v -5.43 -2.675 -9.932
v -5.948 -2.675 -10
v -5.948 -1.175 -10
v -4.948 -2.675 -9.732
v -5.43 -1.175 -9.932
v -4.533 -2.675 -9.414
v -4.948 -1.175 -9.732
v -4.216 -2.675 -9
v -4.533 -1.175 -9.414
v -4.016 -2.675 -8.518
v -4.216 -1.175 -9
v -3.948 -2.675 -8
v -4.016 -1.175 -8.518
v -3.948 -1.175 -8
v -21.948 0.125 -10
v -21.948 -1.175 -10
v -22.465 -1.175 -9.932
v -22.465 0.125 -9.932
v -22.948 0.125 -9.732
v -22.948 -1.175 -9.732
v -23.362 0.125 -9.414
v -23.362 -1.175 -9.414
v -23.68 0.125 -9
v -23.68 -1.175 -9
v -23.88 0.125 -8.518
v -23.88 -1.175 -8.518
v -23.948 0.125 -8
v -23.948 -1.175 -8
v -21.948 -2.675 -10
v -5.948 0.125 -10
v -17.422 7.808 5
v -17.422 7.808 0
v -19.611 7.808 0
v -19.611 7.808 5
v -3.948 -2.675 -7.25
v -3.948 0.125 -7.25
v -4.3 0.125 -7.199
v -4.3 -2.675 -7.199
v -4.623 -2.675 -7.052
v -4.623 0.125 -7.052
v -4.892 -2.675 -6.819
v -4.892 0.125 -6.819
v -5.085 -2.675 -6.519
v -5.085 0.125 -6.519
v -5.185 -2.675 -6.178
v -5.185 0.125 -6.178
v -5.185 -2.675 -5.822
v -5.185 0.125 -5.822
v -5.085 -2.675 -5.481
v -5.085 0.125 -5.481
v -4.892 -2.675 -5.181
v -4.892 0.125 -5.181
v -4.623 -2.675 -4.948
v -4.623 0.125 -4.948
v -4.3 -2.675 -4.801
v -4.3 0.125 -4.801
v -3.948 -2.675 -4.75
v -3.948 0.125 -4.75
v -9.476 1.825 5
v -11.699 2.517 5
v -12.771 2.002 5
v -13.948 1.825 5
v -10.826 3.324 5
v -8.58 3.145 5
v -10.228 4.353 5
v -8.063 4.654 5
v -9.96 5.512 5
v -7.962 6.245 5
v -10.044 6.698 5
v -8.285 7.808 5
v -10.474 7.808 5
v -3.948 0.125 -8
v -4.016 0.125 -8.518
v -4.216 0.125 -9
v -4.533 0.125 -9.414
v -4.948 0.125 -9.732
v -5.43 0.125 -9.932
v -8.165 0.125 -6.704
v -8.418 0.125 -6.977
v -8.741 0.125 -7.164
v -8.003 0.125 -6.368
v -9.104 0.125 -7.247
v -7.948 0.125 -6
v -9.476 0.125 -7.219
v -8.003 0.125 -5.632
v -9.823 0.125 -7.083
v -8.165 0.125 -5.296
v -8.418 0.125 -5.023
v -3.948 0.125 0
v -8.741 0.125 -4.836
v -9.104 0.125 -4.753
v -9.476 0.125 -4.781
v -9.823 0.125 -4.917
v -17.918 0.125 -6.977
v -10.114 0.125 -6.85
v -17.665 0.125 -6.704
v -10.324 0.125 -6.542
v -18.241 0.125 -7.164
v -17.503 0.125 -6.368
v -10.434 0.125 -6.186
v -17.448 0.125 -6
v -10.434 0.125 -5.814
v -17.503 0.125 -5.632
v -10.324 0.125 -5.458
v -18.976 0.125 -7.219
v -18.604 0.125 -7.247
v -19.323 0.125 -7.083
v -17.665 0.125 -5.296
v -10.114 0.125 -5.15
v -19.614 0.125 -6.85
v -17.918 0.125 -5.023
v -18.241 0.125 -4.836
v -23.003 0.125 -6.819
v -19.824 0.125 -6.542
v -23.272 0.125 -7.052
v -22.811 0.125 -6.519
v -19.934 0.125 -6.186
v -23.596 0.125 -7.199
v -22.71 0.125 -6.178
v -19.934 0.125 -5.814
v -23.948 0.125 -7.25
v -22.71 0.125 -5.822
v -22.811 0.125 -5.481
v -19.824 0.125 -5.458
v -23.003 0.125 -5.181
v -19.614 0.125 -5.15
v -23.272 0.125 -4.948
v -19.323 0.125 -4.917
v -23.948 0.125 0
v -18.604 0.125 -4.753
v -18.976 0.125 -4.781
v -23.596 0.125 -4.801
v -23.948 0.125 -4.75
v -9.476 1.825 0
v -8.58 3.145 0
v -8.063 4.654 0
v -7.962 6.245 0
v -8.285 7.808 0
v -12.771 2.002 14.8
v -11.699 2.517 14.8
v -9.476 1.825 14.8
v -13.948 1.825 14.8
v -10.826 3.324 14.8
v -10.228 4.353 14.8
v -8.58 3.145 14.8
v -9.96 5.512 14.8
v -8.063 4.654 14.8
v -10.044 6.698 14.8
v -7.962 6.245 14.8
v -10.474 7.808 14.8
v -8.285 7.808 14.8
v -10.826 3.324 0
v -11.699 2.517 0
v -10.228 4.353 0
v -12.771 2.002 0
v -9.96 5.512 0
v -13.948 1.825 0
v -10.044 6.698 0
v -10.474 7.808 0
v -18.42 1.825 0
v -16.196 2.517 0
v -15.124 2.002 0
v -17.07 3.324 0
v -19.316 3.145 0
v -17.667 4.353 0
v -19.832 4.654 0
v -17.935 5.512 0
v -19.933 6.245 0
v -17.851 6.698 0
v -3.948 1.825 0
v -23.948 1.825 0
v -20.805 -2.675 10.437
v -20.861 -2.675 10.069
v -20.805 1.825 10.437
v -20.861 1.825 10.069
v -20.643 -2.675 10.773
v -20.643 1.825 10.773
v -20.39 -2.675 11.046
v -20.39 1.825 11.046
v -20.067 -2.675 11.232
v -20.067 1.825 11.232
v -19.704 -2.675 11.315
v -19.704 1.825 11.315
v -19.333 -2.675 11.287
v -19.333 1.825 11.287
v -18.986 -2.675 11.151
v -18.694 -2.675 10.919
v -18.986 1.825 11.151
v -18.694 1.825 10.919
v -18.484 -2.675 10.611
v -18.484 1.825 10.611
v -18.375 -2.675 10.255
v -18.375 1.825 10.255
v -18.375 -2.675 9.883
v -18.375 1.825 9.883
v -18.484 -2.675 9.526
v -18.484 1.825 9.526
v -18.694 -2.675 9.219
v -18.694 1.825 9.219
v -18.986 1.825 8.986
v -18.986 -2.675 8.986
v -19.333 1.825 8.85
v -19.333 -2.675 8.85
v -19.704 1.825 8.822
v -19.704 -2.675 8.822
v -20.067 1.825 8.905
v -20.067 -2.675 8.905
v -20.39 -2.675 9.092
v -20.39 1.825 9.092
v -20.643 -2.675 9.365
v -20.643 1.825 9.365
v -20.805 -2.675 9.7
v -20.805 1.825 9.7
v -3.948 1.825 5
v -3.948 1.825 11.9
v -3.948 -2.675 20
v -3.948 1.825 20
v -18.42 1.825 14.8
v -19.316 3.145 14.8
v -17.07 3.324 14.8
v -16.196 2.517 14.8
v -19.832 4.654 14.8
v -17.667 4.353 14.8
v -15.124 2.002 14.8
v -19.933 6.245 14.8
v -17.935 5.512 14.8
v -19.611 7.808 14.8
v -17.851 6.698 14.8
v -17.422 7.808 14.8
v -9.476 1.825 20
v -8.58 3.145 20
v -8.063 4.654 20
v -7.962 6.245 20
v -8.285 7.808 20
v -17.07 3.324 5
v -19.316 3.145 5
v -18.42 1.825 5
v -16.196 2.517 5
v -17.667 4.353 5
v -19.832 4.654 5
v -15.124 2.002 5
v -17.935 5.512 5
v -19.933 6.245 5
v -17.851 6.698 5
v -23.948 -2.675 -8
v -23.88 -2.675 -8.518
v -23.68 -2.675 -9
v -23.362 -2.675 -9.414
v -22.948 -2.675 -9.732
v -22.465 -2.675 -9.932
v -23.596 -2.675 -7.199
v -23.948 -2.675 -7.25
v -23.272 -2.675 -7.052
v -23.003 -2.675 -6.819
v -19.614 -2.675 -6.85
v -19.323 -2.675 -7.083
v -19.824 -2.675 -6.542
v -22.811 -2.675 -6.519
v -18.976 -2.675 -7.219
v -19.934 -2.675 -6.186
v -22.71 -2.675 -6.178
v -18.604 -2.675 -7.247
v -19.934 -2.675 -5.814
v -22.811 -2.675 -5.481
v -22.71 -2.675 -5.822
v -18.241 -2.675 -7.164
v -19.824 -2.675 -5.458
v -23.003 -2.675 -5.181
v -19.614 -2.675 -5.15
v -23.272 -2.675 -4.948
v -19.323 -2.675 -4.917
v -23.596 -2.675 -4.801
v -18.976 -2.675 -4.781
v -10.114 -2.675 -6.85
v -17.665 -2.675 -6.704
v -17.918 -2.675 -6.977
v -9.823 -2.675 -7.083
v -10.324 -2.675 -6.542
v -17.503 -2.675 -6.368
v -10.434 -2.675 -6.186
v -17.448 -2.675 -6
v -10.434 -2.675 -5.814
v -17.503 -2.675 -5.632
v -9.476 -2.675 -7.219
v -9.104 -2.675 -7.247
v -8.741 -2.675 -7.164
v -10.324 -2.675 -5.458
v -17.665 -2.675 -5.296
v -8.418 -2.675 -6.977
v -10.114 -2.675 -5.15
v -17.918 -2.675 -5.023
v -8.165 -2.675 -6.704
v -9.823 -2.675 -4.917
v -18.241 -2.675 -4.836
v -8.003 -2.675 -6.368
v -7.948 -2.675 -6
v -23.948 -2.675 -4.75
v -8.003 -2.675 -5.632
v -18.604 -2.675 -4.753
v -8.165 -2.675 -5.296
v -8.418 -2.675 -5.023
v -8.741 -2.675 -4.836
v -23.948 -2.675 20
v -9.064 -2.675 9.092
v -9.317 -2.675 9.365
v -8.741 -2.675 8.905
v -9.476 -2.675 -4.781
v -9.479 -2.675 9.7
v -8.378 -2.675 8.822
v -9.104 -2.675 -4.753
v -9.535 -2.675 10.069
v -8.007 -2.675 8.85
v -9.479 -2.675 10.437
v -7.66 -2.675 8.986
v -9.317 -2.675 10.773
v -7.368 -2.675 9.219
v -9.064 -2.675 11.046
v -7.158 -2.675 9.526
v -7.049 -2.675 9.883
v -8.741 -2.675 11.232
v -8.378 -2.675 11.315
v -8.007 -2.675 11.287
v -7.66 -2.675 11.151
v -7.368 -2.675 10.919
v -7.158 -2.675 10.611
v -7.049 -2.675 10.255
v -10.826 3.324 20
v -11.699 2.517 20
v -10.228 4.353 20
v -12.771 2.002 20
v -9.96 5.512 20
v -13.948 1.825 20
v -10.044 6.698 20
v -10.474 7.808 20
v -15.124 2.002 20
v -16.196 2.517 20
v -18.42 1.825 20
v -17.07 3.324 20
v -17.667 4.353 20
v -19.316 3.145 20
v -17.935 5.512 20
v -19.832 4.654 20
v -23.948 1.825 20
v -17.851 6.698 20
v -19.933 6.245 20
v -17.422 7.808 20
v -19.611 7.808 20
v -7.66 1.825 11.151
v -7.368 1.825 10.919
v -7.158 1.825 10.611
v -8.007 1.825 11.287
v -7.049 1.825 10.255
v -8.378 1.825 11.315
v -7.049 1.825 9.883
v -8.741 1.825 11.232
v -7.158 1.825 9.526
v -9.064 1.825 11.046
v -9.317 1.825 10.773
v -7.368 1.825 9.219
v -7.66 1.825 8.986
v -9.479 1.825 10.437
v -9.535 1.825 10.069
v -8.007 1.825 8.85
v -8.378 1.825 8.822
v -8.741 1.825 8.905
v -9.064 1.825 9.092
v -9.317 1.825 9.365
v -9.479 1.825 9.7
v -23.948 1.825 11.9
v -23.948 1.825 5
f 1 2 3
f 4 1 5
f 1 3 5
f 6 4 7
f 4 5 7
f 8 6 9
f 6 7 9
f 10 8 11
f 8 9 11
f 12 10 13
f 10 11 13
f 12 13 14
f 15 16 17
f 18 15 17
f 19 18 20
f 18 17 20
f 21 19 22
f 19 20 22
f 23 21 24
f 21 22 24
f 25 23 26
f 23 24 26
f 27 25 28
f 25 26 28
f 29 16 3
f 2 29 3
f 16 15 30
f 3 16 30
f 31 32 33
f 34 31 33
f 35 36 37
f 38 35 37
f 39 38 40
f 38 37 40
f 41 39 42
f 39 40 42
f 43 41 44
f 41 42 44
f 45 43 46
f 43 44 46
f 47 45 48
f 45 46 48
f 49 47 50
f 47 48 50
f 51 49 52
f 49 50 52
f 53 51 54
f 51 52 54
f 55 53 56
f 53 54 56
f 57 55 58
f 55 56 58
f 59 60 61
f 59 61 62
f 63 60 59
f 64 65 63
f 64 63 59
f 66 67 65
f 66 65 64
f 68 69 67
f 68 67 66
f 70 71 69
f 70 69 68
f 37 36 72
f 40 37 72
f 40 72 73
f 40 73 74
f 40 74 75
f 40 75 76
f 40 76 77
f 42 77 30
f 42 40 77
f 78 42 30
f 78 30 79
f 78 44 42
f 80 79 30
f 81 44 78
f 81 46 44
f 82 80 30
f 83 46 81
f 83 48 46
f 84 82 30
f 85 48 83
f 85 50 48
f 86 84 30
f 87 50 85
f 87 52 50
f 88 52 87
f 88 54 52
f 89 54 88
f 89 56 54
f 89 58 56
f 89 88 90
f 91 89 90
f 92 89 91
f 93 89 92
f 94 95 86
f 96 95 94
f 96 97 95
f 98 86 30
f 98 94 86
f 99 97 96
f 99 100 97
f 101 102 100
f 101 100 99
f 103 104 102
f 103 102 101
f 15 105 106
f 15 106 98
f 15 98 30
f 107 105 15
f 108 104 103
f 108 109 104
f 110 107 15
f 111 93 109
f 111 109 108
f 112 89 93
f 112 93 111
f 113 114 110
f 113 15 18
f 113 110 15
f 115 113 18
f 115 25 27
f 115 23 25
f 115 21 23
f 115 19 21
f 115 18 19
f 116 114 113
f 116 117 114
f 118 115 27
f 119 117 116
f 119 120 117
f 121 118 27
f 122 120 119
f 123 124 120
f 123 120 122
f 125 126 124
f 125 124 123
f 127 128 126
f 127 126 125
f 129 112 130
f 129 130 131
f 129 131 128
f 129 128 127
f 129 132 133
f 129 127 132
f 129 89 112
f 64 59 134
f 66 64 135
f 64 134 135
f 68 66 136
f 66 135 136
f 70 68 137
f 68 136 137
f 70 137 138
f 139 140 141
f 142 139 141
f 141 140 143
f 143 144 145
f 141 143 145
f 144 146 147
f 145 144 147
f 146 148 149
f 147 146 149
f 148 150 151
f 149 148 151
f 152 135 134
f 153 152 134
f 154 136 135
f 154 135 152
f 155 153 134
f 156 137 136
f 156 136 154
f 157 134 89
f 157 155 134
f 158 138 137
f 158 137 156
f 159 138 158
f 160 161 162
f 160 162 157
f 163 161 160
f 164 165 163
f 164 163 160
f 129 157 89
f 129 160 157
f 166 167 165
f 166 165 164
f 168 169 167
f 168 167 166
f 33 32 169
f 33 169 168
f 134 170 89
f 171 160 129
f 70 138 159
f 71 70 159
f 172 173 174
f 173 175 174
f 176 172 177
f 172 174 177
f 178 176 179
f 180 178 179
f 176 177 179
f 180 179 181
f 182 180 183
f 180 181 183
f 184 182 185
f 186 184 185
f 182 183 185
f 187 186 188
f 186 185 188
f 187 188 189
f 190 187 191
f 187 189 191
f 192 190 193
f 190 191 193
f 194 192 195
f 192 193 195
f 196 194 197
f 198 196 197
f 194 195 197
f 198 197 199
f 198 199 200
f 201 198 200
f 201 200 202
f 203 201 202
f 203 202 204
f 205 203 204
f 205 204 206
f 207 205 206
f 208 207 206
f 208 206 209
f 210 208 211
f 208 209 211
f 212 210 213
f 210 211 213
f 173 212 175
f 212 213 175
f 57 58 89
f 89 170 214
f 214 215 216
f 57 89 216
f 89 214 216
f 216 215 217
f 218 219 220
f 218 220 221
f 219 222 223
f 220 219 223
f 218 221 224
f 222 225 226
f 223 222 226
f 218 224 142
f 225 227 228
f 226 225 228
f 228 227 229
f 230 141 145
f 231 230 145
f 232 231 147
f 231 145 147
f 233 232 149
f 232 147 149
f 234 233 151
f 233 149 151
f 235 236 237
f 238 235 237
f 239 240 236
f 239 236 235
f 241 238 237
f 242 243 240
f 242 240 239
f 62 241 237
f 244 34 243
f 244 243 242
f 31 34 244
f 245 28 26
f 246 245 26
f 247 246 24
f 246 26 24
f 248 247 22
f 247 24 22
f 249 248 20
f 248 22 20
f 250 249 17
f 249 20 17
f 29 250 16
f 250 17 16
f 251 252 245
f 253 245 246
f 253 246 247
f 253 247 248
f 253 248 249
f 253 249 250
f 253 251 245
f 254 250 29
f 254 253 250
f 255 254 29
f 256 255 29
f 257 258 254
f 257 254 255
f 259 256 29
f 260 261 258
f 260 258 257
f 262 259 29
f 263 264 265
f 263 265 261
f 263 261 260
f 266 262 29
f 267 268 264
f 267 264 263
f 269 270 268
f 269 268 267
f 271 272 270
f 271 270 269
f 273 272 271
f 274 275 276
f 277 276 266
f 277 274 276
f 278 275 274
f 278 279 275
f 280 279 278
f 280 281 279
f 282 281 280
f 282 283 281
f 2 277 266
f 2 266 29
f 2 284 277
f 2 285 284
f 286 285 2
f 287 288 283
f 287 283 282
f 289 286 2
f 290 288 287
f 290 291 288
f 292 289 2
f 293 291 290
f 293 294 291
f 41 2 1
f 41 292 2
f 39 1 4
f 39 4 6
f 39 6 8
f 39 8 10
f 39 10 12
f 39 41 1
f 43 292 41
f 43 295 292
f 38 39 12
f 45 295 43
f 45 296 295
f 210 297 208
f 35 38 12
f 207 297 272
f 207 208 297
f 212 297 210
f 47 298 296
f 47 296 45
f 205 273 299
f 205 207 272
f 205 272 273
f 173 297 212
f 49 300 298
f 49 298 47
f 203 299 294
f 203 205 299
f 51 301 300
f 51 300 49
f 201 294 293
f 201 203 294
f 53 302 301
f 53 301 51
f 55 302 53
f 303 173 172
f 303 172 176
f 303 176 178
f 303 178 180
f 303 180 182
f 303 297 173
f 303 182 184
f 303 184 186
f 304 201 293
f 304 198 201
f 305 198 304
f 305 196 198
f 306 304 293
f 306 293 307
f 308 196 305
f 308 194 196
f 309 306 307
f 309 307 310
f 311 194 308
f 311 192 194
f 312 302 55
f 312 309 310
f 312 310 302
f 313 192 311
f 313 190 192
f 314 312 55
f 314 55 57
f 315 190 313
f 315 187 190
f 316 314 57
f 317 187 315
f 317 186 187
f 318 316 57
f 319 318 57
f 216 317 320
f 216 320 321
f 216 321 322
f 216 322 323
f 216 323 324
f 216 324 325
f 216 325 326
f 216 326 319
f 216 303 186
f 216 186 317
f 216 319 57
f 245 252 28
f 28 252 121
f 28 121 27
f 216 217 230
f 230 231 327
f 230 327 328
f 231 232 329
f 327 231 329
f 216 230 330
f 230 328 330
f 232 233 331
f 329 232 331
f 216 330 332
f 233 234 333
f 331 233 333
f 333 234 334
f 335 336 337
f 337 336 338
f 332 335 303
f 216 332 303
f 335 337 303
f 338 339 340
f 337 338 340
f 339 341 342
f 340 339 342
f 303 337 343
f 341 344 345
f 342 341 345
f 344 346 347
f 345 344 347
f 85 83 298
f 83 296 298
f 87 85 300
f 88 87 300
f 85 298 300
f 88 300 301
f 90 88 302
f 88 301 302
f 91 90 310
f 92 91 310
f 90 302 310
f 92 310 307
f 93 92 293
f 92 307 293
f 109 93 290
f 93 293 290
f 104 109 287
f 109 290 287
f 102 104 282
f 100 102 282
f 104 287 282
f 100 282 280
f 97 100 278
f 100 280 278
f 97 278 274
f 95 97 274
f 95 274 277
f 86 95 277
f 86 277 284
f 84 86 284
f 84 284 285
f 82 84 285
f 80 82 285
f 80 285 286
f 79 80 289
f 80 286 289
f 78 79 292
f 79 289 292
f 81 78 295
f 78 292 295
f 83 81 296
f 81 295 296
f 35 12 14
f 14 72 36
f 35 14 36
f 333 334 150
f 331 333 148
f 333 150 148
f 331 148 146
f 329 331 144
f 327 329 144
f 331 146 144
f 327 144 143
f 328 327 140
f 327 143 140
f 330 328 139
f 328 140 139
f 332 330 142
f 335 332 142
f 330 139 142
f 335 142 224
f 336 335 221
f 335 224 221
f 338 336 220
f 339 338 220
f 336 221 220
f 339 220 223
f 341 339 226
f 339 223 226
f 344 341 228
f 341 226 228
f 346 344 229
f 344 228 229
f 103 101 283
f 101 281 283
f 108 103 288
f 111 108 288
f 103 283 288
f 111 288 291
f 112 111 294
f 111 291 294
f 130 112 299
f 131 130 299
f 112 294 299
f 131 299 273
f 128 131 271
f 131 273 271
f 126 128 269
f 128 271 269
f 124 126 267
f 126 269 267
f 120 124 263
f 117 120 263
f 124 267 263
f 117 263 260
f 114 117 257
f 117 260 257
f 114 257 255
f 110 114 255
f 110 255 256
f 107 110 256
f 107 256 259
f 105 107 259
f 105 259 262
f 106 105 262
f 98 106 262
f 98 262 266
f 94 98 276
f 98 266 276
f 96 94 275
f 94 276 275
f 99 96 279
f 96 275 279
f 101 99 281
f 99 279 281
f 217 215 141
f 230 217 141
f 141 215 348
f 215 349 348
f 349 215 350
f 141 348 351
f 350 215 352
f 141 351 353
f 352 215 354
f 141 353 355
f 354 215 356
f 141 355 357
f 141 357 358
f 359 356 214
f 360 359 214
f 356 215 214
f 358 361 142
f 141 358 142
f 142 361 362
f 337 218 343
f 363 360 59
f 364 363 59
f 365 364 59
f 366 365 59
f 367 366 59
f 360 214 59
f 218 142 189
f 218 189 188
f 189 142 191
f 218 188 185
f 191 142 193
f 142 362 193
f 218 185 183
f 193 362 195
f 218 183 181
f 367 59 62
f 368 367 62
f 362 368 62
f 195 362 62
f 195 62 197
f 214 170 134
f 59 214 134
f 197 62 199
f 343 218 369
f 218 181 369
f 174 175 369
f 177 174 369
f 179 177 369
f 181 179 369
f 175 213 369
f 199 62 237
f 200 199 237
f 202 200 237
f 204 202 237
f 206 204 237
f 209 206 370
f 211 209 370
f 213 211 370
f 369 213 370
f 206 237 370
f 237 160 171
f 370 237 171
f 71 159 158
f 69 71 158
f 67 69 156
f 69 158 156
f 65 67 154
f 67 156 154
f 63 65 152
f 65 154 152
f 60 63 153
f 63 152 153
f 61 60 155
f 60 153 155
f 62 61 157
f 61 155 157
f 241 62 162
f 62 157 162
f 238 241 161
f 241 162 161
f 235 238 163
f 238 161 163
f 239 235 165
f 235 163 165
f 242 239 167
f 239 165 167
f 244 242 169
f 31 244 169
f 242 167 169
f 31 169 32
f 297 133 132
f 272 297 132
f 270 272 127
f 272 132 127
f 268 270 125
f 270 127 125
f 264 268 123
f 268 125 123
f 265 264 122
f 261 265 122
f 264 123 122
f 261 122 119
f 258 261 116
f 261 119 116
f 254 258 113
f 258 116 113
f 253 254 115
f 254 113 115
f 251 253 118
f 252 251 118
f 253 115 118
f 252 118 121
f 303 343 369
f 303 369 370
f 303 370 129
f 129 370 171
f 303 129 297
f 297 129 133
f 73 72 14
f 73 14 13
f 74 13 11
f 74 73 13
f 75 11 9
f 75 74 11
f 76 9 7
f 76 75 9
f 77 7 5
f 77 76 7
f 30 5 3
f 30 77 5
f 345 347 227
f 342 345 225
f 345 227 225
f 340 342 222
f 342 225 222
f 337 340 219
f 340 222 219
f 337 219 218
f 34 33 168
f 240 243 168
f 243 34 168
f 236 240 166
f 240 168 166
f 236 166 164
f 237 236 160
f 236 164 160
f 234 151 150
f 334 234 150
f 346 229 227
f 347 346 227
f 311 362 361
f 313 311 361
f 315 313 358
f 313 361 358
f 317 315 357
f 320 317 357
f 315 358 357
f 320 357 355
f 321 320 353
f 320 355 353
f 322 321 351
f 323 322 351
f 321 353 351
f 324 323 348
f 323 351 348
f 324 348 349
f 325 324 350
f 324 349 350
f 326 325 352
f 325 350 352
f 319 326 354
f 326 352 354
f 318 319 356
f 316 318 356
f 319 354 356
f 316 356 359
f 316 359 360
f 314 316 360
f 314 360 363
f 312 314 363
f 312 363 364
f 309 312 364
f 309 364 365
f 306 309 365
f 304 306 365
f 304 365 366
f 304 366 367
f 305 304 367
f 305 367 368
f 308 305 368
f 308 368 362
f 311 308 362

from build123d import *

# Parameters (mm, degrees)
F1_DEPTH  = 20
F3_DEPTH  = 10
F4_R      = 1.25
F5_DEPTH  = 2.2
F7_DEPTH  = 10
F9_R      = 1.25
F10_DEPTH = 28.001
F11_R     = 2
F14_DEPTH = 1.5
F16_W     = 20
F16_H     = 10
F17_DEPTH = 26.7
F19_R     = 1.25
F20_DEPTH = 32.1
F22_W     = 20
F22_H     = 9.2705127583
F23_DEPTH = 6.9
F24_DEPTH = 2.9
F25_R     = 1.25
F26_DEPTH = 12.5


with BuildPart() as f1:
    # F0 (on Top) → F1 (new body)
    with BuildSketch(Plane.XY):
        with BuildLine():
            Line((-17.4218026286, 7.8075558554), (-19.6106751933, 7.8075558554))
            ThreePointArc((-19.6106751933, 7.8075558554), (-13.947676921, -0.1749805422), (-8.2846786486, 7.8075558554))
            Line((-8.2846786486, 7.8075558554), (-10.4735512133, 7.8075558554))
            ThreePointArc((-10.4735512133, 7.8075558554), (-13.947676921, 1.8250194578), (-17.4218026286, 7.8075558554))
        make_face()
    extrude(amount=F1_DEPTH)

    # F2 (on Top) → F3 (join, symmetric)
    with BuildSketch(Plane.XY):
        Polygon((-3.947676921, 1.8250194578), (-13.947676921, 1.8250194578), (-23.947676921, 1.8250194578), (-23.947676921, -1.1749805422), (-3.947676921, -1.1749805422), align=None)
    extrude(amount=F3_DEPTH, both=True)

    # F4 (on Front) → F5 (cut, symmetric)
    with BuildSketch(Plane.XZ):
        with Locations((-9.197676921, -6)):
            Circle(F4_R)
        with Locations((-18.697676921, -6)):
            Circle(F4_R)
    extrude(amount=F5_DEPTH, both=True, mode=Mode.SUBTRACT)

    # F6 (on face) → F7 (join, through all)
    with BuildSketch(Plane.XY.offset(10)):
        with BuildLine():
            Line((-3.947676921, 1.8250194578), (-9.475540966, 1.8250194578))
            ThreePointArc((-9.475540966, 1.8250194578), (-13.947676921, -0.1749805422), (-18.419812876, 1.8250194578))
            Line((-18.419812876, 1.8250194578), (-23.947676921, 1.8250194578))
            Line((-23.947676921, 1.8250194578), (-23.947676921, -1.1749805422))
            Line((-23.947676921, -1.1749805422), (-3.947676921, -1.1749805422))
            Line((-3.947676921, -1.1749805422), (-3.947676921, 1.8250194578))
        make_face()
    extrude(amount=F7_DEPTH)

    # F9 (on offset) → F10 (cut, through all)
    with BuildSketch(Plane(origin=(0, 26.8250194578, 0), x_dir=(-1, 0, 0), z_dir=(0, 1, 0))):
        with Locations((23.947676921, -6)):
            Circle(F9_R)
        with Locations((3.947676921, -6)):
            Circle(F9_R)
    extrude(amount=-F10_DEPTH, mode=Mode.SUBTRACT)

    # F11
    f11_edges = [f1.edges().sort_by_distance(p)[0] for p in [
        (-23.947677, 0.325019, -10),
        (-3.947677, 0.325019, -10),
    ]]
    fillet(f11_edges, radius=F11_R)

    # F13 (on offset) → F14 (join)
    with BuildSketch(Plane.XZ.offset(1.1749805422)):
        with BuildLine():
            ThreePointArc((-23.947676921, -4.75), (-22.697676921, -6), (-23.947676921, -7.25))
            Line((-23.947676921, -7.25), (-23.947676921, -8))
            ThreePointArc((-23.947676921, -8), (-23.3618904833, -9.4142135624), (-21.947676921, -10))
            Line((-21.947676921, -10), (-5.947676921, -10))
            ThreePointArc((-5.947676921, -10), (-4.5334633586, -9.4142135624), (-3.947676921, -8))
            Line((-3.947676921, -8), (-3.947676921, -7.25))
            ThreePointArc((-3.947676921, -7.25), (-5.197676921, -6), (-3.947676921, -4.75))
            Line((-3.947676921, -4.75), (-3.947676921, 20))
            Line((-3.947676921, 20), (-23.947676921, 20))
            Line((-23.947676921, 20), (-23.947676921, -4.75))
        make_face()
    extrude(amount=F14_DEPTH)

    # F16 (on offset) → F17 (cut)
    with BuildSketch(Plane(origin=(0, 26.8250194578, 0), x_dir=(-1, 0, 0), z_dir=(0, 1, 0))):
        with Locations((13.947676921, -5)):
            Rectangle(F16_W, F16_H)
    extrude(amount=-F17_DEPTH, mode=Mode.SUBTRACT)

    # F19 (on offset) → F20 (cut)
    with BuildSketch(Plane.XZ.offset(25)):
        with Locations((-9.197676921, -6)):
            Circle(F19_R)
        with Locations((-18.697676921, -6)):
            Circle(F19_R)
    extrude(amount=-F20_DEPTH, mode=Mode.SUBTRACT)

    # F22 (on offset) → F23 (cut)
    with BuildSketch(Plane.XY.offset(11.9)):
        with Locations((-13.947676921, 6.460275837)):
            Rectangle(F22_W, F22_H)
    extrude(amount=-F23_DEPTH, mode=Mode.SUBTRACT)

    # F22 (on offset) → F24 (cut)
    with BuildSketch(Plane.XY.offset(11.9)):
        with Locations((-13.947676921, 6.460275837)):
            Rectangle(F22_W, F22_H)
    extrude(amount=F24_DEPTH, mode=Mode.SUBTRACT)

    # F25 (on offset) → F26 (cut, symmetric)
    with BuildSketch(Plane(origin=(0, 1.8250194578, 0), x_dir=(-1, 0, 0), z_dir=(0, 1, 0))):
        with Locations((8.2846786486, 10.0688289385)):
            Circle(F25_R)
        with Locations((19.6106751933, 10.0688289385)):
            Circle(F25_R)
    extrude(amount=F26_DEPTH, both=True, mode=Mode.SUBTRACT)


solid = f1.part
